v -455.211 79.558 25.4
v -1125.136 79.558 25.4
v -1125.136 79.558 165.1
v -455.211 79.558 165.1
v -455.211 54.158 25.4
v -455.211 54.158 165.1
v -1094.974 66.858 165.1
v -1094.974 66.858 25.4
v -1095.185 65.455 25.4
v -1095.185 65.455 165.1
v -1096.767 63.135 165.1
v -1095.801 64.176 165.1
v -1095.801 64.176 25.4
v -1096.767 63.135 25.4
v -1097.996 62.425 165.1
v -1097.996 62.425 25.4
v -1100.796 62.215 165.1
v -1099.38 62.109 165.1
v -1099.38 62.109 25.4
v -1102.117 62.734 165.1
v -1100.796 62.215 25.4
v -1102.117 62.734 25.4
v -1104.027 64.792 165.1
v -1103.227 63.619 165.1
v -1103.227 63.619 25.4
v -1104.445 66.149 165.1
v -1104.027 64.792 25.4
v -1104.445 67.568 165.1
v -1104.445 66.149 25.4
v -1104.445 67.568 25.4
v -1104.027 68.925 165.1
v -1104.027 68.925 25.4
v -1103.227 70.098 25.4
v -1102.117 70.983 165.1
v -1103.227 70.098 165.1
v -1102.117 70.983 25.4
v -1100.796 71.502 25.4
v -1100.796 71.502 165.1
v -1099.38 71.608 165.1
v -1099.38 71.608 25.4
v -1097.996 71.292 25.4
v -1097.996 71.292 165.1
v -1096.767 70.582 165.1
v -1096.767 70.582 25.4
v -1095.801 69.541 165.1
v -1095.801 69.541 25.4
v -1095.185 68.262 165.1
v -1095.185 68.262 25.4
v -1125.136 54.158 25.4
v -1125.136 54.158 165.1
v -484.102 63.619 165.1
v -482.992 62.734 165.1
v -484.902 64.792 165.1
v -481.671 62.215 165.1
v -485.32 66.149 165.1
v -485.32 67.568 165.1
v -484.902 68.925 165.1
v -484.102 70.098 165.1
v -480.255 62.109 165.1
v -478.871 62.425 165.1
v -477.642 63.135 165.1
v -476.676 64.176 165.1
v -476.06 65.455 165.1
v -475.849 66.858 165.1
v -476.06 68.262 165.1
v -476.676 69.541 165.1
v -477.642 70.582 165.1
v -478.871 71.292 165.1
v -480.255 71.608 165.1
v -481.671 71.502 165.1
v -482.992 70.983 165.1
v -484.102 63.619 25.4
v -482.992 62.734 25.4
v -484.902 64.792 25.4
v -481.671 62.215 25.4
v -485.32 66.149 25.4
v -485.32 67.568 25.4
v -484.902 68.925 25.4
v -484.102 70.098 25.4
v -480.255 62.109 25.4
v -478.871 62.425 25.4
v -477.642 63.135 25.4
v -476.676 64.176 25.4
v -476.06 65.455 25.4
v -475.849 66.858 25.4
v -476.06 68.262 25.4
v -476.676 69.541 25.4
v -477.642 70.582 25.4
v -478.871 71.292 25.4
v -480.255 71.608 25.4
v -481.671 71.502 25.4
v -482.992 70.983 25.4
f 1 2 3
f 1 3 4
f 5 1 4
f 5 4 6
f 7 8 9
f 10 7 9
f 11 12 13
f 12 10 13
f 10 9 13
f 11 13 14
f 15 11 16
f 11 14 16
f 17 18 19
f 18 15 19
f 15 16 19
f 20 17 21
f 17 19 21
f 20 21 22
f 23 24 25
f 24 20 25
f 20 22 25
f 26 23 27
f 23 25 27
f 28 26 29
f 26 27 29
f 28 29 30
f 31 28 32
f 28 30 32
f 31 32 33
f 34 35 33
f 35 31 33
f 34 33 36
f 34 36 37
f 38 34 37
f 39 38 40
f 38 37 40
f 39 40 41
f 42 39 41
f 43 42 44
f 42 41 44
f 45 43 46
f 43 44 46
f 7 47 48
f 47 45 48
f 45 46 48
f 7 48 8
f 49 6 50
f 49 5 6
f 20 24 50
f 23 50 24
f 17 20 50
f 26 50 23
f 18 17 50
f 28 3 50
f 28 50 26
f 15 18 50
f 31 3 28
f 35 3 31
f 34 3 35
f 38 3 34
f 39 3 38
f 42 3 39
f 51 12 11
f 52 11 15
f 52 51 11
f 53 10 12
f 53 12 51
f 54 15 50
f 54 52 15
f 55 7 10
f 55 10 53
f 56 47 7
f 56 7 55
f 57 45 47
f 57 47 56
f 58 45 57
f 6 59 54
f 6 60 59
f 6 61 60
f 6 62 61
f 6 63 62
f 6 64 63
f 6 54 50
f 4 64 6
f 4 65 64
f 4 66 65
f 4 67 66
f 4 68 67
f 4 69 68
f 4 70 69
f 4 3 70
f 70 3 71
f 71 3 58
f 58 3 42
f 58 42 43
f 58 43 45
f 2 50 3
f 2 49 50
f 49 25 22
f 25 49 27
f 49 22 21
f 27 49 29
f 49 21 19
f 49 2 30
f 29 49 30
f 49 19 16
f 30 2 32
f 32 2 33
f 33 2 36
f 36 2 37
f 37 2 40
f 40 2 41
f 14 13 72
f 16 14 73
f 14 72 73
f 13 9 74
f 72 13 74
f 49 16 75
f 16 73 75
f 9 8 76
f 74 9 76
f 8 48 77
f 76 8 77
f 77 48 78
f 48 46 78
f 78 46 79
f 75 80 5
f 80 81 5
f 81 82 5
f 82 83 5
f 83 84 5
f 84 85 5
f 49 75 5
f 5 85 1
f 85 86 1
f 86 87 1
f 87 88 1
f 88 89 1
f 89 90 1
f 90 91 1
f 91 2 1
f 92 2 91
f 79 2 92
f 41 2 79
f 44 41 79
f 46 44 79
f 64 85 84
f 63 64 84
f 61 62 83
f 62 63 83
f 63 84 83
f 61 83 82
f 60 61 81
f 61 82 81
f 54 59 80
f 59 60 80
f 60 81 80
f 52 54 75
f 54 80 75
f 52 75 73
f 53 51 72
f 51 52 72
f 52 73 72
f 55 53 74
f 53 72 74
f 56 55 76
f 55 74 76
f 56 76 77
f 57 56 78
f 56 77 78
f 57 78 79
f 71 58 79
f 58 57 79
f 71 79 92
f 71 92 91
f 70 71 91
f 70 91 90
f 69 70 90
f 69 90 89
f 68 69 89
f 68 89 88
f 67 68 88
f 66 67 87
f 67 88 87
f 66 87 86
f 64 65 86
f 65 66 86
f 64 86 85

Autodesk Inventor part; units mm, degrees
ref_plane "YZ Plane" through (0, 0, 0) normal (1, 0, 0) x (0, 1, 0)
ref_plane "XZ Plane" through (0, 0, 0) normal (0, 1, 0) x (-1, 0, 0)
ref_plane "XY Plane" through (0, 0, 0) normal (0, 0, 1) x (1, 0, 0)
ref_plane "Work Plane1" through (0, 0, 25.4) normal (0, 0, 1) x (1, 0, 0)
sketch "Sketch3" plane through (0, 0, 25.4) normal (0, 0, 1) x (1, 0, 0)
  line L0 (-455.2111, 54.1585) -> (-1125.1361, 54.1585)
  line L1 (-1125.1361, 54.1585) -> (-1125.1361, 79.5585)
  line L2 (-1125.1361, 79.5585) -> (-455.2111, 79.5585)
  line L3 (-455.2111, 79.5585) -> (-455.2111, 54.1585)
  circle A0 centre (-480.6111, 66.8585) radius 4.7625
  circle A1 centre (-1099.7361, 66.8585) radius 4.7625
  point P0 (0, 0)
  dimension "d8" = 669.925
  dimension "d9" = 25.4
  dimension "d11" = 9.525
  dimension "d13" = 9.525
extrude "Extrusion3" add sketch "Sketch3" along normal blind 139.7
properties part number "ArmBacking"
